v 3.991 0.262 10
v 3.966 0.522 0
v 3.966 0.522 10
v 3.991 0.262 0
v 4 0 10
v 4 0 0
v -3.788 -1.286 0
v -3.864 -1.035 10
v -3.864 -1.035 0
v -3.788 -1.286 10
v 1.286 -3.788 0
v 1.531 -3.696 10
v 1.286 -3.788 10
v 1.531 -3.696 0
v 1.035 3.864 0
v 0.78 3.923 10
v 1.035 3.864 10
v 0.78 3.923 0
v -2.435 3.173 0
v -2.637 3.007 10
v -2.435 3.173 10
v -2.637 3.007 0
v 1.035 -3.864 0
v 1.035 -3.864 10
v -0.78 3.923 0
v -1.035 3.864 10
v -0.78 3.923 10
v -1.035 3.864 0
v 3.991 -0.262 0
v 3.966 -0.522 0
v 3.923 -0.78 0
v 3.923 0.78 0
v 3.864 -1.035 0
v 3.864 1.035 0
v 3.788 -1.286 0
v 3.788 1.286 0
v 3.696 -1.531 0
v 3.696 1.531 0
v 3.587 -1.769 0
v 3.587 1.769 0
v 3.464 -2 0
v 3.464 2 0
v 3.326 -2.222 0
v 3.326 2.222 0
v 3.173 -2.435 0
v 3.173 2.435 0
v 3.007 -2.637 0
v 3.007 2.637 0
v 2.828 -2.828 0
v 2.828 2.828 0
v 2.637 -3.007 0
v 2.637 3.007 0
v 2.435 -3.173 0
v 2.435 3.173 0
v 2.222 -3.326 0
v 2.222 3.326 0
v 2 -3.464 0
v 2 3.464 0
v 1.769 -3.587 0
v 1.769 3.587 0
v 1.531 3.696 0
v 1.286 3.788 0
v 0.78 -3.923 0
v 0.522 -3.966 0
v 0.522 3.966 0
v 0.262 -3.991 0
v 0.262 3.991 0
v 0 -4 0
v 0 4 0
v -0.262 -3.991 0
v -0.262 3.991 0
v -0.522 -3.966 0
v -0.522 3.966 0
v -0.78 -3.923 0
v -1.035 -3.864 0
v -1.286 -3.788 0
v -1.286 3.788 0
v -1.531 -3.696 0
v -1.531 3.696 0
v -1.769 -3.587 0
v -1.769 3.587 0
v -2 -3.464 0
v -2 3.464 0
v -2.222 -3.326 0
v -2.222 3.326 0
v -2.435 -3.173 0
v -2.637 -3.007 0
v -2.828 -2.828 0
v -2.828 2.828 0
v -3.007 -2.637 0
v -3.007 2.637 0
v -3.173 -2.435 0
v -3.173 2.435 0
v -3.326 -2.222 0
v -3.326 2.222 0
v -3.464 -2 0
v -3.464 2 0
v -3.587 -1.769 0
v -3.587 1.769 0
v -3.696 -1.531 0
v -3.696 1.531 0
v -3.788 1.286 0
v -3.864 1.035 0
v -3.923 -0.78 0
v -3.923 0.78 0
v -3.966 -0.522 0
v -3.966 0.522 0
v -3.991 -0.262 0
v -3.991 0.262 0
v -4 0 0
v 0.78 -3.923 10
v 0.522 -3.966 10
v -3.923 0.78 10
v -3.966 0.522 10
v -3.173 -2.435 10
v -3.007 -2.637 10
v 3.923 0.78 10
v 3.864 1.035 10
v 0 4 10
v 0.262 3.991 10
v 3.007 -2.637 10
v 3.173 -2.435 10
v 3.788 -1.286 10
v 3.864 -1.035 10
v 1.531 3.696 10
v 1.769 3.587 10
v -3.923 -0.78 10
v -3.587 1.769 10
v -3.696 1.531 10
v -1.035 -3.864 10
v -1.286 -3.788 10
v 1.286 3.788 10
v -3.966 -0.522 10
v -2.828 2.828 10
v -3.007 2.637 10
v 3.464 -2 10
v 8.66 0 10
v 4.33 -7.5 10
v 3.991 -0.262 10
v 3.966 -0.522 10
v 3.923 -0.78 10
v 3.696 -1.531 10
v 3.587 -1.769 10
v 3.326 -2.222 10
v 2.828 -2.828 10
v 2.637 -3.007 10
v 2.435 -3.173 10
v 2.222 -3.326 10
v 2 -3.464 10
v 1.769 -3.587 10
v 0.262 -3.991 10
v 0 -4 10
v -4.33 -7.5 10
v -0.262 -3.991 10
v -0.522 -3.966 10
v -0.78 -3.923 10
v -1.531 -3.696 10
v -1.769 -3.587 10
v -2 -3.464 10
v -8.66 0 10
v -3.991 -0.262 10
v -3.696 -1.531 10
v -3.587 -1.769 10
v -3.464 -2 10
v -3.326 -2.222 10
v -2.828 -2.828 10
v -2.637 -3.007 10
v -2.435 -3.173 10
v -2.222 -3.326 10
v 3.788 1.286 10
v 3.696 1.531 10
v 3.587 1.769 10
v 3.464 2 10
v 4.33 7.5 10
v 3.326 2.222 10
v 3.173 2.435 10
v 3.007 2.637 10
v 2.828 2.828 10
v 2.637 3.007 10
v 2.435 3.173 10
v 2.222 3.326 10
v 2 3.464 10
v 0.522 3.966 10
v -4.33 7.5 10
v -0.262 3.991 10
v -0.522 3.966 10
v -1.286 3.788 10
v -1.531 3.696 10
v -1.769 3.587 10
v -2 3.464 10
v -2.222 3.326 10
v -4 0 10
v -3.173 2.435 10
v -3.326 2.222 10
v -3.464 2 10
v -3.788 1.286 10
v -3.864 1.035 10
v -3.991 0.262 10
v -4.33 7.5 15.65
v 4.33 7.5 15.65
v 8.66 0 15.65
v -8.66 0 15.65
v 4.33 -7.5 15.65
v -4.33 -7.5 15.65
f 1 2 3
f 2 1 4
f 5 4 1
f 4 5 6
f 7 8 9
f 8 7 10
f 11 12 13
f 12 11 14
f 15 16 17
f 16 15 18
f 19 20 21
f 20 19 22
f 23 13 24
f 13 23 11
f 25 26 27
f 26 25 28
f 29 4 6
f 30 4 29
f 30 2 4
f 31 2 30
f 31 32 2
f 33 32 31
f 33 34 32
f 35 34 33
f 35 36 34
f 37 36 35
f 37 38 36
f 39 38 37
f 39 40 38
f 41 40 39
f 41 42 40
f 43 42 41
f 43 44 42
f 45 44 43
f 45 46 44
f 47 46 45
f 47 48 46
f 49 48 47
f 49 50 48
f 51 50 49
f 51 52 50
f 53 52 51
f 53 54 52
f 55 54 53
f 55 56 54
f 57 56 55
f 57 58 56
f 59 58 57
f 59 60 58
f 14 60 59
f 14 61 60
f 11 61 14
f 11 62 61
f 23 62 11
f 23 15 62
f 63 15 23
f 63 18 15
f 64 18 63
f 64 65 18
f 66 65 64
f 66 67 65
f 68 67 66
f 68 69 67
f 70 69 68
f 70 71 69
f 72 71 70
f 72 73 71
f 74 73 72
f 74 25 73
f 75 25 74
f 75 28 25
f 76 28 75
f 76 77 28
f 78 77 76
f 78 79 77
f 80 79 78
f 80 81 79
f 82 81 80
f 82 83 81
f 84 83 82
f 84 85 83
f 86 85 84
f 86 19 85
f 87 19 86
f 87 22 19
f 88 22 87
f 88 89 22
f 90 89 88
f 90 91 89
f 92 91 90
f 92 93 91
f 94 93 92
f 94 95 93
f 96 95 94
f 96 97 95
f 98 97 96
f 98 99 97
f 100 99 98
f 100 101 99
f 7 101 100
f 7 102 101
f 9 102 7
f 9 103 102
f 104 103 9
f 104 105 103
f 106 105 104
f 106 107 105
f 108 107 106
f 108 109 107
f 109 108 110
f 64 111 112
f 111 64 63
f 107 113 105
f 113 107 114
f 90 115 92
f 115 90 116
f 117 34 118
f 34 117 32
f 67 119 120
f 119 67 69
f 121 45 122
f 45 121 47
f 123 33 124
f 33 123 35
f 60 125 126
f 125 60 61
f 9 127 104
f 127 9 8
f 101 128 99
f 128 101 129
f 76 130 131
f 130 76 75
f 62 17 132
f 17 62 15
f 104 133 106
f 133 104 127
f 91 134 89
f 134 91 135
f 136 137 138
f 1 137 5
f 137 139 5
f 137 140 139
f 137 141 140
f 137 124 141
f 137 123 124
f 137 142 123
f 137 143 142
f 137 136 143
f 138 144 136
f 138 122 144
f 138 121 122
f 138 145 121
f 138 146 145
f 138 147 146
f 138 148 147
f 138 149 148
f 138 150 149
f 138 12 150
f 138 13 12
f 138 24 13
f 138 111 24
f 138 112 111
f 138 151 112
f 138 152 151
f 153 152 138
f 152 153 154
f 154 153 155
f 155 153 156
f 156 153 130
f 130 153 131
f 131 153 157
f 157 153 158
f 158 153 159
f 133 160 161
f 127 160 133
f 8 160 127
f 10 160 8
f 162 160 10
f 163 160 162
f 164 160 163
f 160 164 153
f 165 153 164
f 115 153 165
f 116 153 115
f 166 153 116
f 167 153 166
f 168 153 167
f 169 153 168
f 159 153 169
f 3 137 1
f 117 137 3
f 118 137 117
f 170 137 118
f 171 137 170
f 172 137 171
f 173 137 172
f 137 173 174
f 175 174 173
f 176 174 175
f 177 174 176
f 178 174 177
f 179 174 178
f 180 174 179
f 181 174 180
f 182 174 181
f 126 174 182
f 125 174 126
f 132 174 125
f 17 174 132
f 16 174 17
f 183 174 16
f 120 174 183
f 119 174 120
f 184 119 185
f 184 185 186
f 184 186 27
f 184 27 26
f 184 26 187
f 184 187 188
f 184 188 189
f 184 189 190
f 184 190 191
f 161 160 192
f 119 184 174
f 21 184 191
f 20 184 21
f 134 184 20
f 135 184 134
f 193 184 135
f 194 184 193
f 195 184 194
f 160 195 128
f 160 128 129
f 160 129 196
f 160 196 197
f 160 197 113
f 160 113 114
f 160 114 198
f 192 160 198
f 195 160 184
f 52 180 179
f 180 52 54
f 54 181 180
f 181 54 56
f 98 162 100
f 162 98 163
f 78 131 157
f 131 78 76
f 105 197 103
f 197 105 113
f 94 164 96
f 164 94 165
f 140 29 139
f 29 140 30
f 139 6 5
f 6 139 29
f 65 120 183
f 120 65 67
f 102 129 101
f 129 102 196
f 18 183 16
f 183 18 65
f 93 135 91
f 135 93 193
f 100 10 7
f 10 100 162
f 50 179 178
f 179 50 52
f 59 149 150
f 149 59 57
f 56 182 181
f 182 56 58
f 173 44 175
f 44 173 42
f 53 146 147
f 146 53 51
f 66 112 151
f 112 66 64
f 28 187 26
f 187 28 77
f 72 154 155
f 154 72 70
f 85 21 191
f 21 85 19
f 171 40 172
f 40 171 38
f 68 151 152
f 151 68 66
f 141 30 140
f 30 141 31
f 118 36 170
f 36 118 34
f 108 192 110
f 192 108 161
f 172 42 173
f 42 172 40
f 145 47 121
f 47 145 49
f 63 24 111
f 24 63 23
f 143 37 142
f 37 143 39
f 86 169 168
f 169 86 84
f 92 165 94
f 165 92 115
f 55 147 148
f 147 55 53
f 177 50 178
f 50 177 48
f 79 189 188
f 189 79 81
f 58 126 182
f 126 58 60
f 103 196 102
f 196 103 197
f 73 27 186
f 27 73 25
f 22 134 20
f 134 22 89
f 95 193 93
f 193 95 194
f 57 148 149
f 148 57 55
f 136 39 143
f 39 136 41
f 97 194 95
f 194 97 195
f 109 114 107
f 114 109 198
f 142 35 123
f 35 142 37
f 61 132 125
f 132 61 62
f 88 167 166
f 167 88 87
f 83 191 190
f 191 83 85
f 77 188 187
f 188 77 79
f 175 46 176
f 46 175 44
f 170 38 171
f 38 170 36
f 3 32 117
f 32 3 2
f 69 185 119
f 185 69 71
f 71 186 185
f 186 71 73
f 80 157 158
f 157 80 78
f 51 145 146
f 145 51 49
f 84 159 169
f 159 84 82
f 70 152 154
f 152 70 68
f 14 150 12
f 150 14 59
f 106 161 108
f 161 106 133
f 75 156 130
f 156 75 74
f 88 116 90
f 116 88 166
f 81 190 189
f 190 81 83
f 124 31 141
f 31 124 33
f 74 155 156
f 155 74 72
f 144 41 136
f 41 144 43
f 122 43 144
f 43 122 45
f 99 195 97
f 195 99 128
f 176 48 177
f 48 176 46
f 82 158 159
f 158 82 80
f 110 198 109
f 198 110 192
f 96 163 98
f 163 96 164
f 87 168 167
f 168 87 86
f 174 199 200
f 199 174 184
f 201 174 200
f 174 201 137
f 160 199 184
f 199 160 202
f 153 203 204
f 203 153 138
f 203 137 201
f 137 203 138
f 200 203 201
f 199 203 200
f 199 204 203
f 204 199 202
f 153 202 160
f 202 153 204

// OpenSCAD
$fn = 96;

// Parameters (mm)
shaft_d = 8.0;
shaft_r = shaft_d/2;

head_flat_d = 15.0;     // across flats
head_h = 5.65;

shaft_len = 10.0;

// Derived: hex circumradius from across-flats
hex_R = head_flat_d / sqrt(3);

module hex_prism(h, R){
    linear_extrude(height=h)
        polygon(points=[
            [ R, 0],
            [ R/2,  R*sqrt(3)/2],
            [-R/2,  R*sqrt(3)/2],
            [-R, 0],
            [-R/2, -R*sqrt(3)/2],
            [ R/2, -R*sqrt(3)/2]
        ]);
}

union() {
    // Shaft (under head)
    cylinder(h=shaft_len, r=shaft_r);

    // Hex head on top of shaft
    translate([0,0,shaft_len])
        hex_prism(head_h, hex_R);
}
